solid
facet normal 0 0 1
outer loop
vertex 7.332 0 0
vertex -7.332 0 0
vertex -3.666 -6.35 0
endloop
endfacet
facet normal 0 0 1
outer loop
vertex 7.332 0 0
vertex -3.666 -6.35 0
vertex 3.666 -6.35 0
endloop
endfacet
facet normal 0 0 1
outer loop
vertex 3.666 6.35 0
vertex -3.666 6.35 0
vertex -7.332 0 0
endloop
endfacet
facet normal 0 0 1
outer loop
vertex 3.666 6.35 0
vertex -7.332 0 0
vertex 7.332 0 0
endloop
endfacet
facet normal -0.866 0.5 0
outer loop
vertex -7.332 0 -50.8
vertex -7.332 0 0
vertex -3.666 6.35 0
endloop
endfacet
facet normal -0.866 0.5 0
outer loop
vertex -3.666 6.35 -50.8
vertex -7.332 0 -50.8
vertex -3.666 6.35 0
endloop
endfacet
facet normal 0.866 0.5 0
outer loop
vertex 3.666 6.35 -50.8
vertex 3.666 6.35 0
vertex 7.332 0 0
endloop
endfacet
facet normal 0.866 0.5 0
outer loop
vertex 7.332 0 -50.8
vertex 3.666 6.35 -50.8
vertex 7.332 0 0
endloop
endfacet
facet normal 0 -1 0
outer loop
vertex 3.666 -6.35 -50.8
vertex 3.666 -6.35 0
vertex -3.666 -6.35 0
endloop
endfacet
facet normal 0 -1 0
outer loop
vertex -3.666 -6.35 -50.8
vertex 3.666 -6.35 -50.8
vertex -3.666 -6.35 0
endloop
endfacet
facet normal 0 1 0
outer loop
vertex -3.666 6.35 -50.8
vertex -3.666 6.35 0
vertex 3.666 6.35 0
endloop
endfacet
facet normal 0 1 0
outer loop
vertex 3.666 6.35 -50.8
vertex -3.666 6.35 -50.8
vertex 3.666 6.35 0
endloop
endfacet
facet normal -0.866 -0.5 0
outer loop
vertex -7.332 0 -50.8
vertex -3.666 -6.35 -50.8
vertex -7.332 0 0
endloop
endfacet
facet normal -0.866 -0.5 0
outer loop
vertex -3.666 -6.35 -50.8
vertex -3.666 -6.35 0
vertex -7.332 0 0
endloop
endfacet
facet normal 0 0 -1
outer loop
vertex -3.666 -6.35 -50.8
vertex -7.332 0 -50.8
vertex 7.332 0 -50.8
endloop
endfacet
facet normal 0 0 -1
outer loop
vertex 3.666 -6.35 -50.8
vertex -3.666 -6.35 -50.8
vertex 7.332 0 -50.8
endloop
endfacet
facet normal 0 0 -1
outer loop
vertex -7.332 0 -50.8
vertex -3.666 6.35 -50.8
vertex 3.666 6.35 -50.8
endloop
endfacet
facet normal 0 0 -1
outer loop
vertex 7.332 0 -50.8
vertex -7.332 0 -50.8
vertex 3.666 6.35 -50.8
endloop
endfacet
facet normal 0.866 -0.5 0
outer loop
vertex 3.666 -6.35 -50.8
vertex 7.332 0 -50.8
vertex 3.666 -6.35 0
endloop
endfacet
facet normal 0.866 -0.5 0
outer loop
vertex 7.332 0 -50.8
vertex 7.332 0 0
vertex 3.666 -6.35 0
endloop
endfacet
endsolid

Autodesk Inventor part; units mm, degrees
ref_plane "YZ Plane" through (0, 0, 0) normal (1, 0, 0) x (0, 1, 0)
ref_plane "XZ Plane" through (0, 0, 0) normal (0, 1, 0) x (-1, 0, 0)
ref_plane "XY Plane" through (0, 0, 0) normal (0, 0, 1) x (1, 0, 0)
sketch "Sketch1" plane through (0, 0, 0) normal (0, 0, 1) x (1, 0, 0)
  line L0 (7.3323, 0) -> (3.6662, -6.35)
  line L1 (3.6662, -6.35) -> (-3.6662, -6.35)
  line L2 (-3.6662, -6.35) -> (-7.3323, 0)
  line L3 (-7.3323, 0) -> (-3.6662, 6.35)
  line L4 (-3.6662, 6.35) -> (3.6662, 6.35)
  line L5 (3.6662, 6.35) -> (7.3323, 0)
  point P0 (0, 0)
  point P1 (0, 0)
  dimension "d0" = 12.7
extrude "Extrusion1" add sketch "Sketch1" against normal blind 50.8
properties part number "hexShaft"
